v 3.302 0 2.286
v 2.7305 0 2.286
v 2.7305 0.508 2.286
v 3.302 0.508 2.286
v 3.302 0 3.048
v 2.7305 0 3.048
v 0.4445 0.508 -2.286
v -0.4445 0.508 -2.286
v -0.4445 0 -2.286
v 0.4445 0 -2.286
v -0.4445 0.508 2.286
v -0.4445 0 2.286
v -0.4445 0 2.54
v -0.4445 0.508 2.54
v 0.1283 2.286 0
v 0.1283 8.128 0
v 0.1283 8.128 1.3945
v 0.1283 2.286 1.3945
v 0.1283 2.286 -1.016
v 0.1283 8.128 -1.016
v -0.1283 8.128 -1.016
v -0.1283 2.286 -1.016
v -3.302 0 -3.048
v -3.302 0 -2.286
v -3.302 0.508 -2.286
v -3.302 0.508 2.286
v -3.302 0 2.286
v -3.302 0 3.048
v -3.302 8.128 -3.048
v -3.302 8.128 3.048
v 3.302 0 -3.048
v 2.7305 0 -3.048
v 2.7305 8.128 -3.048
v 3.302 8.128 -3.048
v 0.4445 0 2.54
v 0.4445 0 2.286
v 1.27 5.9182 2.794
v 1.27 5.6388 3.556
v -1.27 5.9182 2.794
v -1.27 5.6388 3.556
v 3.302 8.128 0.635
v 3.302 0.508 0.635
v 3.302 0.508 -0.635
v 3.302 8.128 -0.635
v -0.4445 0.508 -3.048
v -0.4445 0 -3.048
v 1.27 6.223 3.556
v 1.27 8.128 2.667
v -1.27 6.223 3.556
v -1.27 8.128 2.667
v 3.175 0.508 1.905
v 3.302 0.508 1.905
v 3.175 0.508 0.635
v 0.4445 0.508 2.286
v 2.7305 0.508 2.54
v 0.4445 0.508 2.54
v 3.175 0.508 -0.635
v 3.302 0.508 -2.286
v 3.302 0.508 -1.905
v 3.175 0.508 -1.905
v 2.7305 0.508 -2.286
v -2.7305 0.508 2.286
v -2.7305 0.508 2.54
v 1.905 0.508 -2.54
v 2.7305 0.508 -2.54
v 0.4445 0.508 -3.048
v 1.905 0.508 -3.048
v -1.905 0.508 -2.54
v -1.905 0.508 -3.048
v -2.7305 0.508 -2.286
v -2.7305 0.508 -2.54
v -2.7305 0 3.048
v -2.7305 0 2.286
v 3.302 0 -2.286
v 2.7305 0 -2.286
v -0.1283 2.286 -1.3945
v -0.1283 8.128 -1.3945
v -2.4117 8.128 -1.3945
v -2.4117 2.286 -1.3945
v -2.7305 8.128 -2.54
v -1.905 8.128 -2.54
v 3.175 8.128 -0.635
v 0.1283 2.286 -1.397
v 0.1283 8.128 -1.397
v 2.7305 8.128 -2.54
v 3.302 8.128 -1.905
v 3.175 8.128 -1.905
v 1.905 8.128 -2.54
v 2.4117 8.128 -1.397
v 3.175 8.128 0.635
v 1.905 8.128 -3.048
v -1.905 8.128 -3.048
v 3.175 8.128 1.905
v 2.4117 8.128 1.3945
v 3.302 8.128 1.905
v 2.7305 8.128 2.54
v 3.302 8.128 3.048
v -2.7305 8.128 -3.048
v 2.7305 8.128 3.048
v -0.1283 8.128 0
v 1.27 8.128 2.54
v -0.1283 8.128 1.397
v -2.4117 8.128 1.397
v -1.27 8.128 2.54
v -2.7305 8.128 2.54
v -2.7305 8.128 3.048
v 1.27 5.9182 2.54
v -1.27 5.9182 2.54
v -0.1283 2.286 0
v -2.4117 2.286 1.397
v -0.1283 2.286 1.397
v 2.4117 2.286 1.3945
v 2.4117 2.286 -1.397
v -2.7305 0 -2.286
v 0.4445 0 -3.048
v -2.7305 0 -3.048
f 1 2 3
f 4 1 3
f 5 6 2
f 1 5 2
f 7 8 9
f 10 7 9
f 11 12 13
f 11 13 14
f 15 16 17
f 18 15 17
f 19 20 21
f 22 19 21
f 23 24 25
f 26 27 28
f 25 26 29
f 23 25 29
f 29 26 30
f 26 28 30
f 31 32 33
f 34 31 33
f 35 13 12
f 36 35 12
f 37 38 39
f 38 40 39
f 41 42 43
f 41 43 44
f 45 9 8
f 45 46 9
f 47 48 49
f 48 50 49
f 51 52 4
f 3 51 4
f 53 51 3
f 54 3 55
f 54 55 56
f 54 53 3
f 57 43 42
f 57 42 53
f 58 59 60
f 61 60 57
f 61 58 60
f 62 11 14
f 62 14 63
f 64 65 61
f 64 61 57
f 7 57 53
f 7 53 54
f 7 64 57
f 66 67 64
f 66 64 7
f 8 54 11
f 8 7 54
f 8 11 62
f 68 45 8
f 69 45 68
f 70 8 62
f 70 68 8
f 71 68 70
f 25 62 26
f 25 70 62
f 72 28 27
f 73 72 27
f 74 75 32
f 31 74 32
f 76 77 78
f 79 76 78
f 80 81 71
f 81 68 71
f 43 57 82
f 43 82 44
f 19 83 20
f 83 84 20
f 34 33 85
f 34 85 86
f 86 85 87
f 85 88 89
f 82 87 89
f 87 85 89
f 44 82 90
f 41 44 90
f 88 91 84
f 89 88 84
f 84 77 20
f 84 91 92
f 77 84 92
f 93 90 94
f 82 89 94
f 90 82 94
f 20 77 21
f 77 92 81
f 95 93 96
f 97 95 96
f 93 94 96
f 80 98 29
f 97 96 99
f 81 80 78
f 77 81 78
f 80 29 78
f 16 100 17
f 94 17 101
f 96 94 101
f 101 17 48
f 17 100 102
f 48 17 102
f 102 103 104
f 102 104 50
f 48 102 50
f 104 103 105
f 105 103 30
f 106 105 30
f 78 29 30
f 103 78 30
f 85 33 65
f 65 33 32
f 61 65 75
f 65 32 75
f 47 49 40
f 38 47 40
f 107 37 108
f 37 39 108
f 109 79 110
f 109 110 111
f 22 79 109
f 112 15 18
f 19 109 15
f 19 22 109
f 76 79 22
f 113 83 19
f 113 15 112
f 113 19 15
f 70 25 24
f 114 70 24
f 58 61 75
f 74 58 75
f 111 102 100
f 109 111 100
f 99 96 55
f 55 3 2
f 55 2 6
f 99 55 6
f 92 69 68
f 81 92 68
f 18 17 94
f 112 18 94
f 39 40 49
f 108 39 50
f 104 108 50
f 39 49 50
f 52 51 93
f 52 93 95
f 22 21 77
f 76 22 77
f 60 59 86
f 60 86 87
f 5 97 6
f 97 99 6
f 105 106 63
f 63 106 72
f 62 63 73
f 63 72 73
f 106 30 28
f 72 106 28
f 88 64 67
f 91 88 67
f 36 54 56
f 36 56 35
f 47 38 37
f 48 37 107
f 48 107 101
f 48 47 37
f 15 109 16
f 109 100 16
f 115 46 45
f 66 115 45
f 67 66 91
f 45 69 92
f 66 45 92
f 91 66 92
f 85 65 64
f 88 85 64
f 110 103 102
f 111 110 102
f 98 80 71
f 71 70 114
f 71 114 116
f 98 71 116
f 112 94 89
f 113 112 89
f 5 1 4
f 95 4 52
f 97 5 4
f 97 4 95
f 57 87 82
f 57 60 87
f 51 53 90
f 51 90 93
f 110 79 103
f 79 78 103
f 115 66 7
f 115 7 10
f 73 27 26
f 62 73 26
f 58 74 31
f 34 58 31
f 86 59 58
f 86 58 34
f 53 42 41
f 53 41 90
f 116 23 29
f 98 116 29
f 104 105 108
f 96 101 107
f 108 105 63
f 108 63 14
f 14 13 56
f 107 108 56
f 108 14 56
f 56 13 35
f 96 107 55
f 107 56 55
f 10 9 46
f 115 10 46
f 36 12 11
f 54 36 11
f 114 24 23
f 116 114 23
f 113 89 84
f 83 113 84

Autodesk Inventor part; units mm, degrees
sketch "Sketch_1" plane through (0, 0, 0) normal (1, 0, 0) x (0, 1, 0)
  line L0 (8.128, 3.048) -> (0, 3.048)
  line L1 (0, 3.048) -> (0, 2.286)
  line L2 (0, 2.286) -> (0.508, 2.286)
  line L3 (0.508, 2.286) -> (0.508, -2.286)
  line L4 (0.508, -2.286) -> (0, -2.286)
  line L5 (0, -2.286) -> (0, -3.048)
  line L6 (0, -3.048) -> (8.128, -3.048)
  line L7 (8.128, -3.048) -> (8.128, 3.048)
extrude "Extrusion1" add sketch "Sketch_1" along normal mid plane 6.604
sketch "Sketch_4" plane through (0, 0, 0) normal (0, 0, 1) x (1, 0, 0)
  line L0 (-2.7305, 0.508) -> (-2.7305, -0.508)
  line L1 (-2.7305, -0.508) -> (-0.4445, -0.508)
  line L2 (-0.4445, -0.508) -> (-0.4445, 0.508)
  line L3 (-0.4445, 0.508) -> (-2.7305, 0.508)
extrude "Extrusion2" cut sketch "Sketch_4" along normal mid plane 6.096
sketch "Sketch_5" plane through (0, 0, 0) normal (0, 0, 1) x (1, 0, 0)
  line L0 (0.4445, 0.508) -> (0.4445, -0.508)
  line L1 (0.4445, -0.508) -> (2.7305, -0.508)
  line L2 (2.7305, -0.508) -> (2.7305, 0.508)
  line L3 (2.7305, 0.508) -> (0.4445, 0.508)
extrude "Extrusion3" cut sketch "Sketch_5" along normal mid plane 6.096
sketch "Sketch_9" plane through (0, 8.128, 0) normal (0, 1, 0) x (1, 0, 0)
  line L0 (-2.4117, 1.3945) -> (-2.4117, -1.397)
  line L1 (-2.4117, -1.397) -> (-0.1283, -1.397)
  line L2 (-0.1283, -1.397) -> (-0.1283, 1.3945)
  line L3 (-0.1283, 1.3945) -> (-2.4117, 1.3945)
extrude "Extrusion4" cut sketch "Sketch_9" against normal blind 5.842
pattern_linear "Rectangular Pattern1" count 2 spacing 2.54 along (1, 0, -0.001) of "Extrusion4"
sketch "Sketch_21" plane through (0, 0, 0) normal (0, 1, 0) x (-1, 0, 0)
  line L0 (3.81, -3.81) -> (3.81, 3.556)
  line L1 (3.81, 3.556) -> (-3.81, 3.556)
  line L2 (-3.81, 3.556) -> (-3.81, -3.81)
  line L3 (-3.81, -3.81) -> (3.81, -3.81)
  line L4 (3.302, -3.048) -> (3.302, 3.048)
  line L5 (3.302, 3.048) -> (2.7305, 3.048)
  line L6 (2.7305, 3.048) -> (2.7305, 2.54)
  line L7 (2.7305, 2.54) -> (-2.7305, 2.54)
  line L8 (-2.7305, 2.54) -> (-2.7305, 3.048)
  line L9 (-2.7305, 3.048) -> (-3.302, 3.048)
  line L10 (-3.302, 3.048) -> (-3.302, -3.048)
  line L11 (-3.302, -3.048) -> (-2.7305, -3.048)
  line L12 (-2.7305, -3.048) -> (-2.7305, -2.54)
  line L13 (-2.7305, -2.54) -> (-1.905, -2.54)
  line L14 (-1.905, -2.54) -> (-1.905, -3.048)
  line L15 (-1.905, -3.048) -> (1.905, -3.048)
  line L16 (1.905, -3.048) -> (1.905, -2.54)
  line L17 (1.905, -2.54) -> (2.7305, -2.54)
  line L18 (2.7305, -2.54) -> (2.7305, -3.048)
  line L19 (2.7305, -3.048) -> (3.302, -3.048)
extrude "Extrusion5" cut sketch "Sketch_21" along normal blind 8.128
sketch "Sketch_25" plane through (0, 0, 0) normal (1, 0, 0) x (0, 1, 0)
  line L0 (6.223, 3.556) -> (5.6388, 3.556)
  line L1 (5.6388, 3.556) -> (5.9182, 2.794)
  line L2 (5.9182, 2.794) -> (5.9182, 2.54)
  line L3 (5.9182, 2.54) -> (8.128, 2.54)
  line L4 (8.128, 2.54) -> (8.128, 2.667)
  line L5 (8.128, 2.667) -> (6.223, 3.556)
extrude "Extrusion6" add sketch "Sketch_25" along normal mid plane 2.54
sketch "Sketch_26" plane through (0, 8.128, 0) normal (0, 1, 0) x (1, 0, 0)
  line L0 (-0.508, 1.016) -> (-0.508, 0)
  line L1 (-0.508, 0) -> (0.508, 0)
  line L2 (0.508, 0) -> (0.508, 1.016)
  line L3 (0.508, 1.016) -> (-0.508, 1.016)
extrude "Extrusion7" cut sketch "Sketch_26" against normal blind 5.842
sketch "Sketch_38" plane through (0, 0, 0) normal (0, 1, 0) x (-1, 0, 0)
  line L0 (-3.175, 0.635) -> (-3.175, 1.905)
  line L1 (-3.175, 1.905) -> (-3.556, 1.905)
  line L2 (-3.556, 1.905) -> (-3.556, -1.905)
  line L3 (-3.556, -1.905) -> (-3.175, -1.905)
  line L4 (-3.175, -1.905) -> (-3.175, -0.635)
  line L5 (-3.175, -0.635) -> (-3.429, -0.635)
  line L6 (-3.429, -0.635) -> (-3.429, 0.635)
  line L7 (-3.429, 0.635) -> (-3.175, 0.635)
extrude "Extrusion8" cut sketch "Sketch_38" along normal blind 8.128
ref_plane "header_to_dummy_XY" through (0, 0, 0) normal (0, -1, 0) x (1, 0, 0)
ref_plane "header_to_dummy_YZ" through (0, 0, 0) normal (1, 0, 0) x (0, 0, 1)
ref_plane "header_to_dummy_ZX" through (0, 0, 0) normal (0, 0, 1) x (0, -1, 0)
ref_plane "header_to_pad_XY" through (0, 8.128, 0) normal (0, 1, 0) x (1, 0, 0)
ref_plane "header_to_pad_YZ" through (0, 8.128, 0) normal (1, 0, 0) x (0, 0, -1)
ref_plane "header_to_pad_ZX" through (0, 8.128, 0) normal (0, 0, -1) x (0, 1, 0)
properties part number "IPL1-102-01-S-K_header"
